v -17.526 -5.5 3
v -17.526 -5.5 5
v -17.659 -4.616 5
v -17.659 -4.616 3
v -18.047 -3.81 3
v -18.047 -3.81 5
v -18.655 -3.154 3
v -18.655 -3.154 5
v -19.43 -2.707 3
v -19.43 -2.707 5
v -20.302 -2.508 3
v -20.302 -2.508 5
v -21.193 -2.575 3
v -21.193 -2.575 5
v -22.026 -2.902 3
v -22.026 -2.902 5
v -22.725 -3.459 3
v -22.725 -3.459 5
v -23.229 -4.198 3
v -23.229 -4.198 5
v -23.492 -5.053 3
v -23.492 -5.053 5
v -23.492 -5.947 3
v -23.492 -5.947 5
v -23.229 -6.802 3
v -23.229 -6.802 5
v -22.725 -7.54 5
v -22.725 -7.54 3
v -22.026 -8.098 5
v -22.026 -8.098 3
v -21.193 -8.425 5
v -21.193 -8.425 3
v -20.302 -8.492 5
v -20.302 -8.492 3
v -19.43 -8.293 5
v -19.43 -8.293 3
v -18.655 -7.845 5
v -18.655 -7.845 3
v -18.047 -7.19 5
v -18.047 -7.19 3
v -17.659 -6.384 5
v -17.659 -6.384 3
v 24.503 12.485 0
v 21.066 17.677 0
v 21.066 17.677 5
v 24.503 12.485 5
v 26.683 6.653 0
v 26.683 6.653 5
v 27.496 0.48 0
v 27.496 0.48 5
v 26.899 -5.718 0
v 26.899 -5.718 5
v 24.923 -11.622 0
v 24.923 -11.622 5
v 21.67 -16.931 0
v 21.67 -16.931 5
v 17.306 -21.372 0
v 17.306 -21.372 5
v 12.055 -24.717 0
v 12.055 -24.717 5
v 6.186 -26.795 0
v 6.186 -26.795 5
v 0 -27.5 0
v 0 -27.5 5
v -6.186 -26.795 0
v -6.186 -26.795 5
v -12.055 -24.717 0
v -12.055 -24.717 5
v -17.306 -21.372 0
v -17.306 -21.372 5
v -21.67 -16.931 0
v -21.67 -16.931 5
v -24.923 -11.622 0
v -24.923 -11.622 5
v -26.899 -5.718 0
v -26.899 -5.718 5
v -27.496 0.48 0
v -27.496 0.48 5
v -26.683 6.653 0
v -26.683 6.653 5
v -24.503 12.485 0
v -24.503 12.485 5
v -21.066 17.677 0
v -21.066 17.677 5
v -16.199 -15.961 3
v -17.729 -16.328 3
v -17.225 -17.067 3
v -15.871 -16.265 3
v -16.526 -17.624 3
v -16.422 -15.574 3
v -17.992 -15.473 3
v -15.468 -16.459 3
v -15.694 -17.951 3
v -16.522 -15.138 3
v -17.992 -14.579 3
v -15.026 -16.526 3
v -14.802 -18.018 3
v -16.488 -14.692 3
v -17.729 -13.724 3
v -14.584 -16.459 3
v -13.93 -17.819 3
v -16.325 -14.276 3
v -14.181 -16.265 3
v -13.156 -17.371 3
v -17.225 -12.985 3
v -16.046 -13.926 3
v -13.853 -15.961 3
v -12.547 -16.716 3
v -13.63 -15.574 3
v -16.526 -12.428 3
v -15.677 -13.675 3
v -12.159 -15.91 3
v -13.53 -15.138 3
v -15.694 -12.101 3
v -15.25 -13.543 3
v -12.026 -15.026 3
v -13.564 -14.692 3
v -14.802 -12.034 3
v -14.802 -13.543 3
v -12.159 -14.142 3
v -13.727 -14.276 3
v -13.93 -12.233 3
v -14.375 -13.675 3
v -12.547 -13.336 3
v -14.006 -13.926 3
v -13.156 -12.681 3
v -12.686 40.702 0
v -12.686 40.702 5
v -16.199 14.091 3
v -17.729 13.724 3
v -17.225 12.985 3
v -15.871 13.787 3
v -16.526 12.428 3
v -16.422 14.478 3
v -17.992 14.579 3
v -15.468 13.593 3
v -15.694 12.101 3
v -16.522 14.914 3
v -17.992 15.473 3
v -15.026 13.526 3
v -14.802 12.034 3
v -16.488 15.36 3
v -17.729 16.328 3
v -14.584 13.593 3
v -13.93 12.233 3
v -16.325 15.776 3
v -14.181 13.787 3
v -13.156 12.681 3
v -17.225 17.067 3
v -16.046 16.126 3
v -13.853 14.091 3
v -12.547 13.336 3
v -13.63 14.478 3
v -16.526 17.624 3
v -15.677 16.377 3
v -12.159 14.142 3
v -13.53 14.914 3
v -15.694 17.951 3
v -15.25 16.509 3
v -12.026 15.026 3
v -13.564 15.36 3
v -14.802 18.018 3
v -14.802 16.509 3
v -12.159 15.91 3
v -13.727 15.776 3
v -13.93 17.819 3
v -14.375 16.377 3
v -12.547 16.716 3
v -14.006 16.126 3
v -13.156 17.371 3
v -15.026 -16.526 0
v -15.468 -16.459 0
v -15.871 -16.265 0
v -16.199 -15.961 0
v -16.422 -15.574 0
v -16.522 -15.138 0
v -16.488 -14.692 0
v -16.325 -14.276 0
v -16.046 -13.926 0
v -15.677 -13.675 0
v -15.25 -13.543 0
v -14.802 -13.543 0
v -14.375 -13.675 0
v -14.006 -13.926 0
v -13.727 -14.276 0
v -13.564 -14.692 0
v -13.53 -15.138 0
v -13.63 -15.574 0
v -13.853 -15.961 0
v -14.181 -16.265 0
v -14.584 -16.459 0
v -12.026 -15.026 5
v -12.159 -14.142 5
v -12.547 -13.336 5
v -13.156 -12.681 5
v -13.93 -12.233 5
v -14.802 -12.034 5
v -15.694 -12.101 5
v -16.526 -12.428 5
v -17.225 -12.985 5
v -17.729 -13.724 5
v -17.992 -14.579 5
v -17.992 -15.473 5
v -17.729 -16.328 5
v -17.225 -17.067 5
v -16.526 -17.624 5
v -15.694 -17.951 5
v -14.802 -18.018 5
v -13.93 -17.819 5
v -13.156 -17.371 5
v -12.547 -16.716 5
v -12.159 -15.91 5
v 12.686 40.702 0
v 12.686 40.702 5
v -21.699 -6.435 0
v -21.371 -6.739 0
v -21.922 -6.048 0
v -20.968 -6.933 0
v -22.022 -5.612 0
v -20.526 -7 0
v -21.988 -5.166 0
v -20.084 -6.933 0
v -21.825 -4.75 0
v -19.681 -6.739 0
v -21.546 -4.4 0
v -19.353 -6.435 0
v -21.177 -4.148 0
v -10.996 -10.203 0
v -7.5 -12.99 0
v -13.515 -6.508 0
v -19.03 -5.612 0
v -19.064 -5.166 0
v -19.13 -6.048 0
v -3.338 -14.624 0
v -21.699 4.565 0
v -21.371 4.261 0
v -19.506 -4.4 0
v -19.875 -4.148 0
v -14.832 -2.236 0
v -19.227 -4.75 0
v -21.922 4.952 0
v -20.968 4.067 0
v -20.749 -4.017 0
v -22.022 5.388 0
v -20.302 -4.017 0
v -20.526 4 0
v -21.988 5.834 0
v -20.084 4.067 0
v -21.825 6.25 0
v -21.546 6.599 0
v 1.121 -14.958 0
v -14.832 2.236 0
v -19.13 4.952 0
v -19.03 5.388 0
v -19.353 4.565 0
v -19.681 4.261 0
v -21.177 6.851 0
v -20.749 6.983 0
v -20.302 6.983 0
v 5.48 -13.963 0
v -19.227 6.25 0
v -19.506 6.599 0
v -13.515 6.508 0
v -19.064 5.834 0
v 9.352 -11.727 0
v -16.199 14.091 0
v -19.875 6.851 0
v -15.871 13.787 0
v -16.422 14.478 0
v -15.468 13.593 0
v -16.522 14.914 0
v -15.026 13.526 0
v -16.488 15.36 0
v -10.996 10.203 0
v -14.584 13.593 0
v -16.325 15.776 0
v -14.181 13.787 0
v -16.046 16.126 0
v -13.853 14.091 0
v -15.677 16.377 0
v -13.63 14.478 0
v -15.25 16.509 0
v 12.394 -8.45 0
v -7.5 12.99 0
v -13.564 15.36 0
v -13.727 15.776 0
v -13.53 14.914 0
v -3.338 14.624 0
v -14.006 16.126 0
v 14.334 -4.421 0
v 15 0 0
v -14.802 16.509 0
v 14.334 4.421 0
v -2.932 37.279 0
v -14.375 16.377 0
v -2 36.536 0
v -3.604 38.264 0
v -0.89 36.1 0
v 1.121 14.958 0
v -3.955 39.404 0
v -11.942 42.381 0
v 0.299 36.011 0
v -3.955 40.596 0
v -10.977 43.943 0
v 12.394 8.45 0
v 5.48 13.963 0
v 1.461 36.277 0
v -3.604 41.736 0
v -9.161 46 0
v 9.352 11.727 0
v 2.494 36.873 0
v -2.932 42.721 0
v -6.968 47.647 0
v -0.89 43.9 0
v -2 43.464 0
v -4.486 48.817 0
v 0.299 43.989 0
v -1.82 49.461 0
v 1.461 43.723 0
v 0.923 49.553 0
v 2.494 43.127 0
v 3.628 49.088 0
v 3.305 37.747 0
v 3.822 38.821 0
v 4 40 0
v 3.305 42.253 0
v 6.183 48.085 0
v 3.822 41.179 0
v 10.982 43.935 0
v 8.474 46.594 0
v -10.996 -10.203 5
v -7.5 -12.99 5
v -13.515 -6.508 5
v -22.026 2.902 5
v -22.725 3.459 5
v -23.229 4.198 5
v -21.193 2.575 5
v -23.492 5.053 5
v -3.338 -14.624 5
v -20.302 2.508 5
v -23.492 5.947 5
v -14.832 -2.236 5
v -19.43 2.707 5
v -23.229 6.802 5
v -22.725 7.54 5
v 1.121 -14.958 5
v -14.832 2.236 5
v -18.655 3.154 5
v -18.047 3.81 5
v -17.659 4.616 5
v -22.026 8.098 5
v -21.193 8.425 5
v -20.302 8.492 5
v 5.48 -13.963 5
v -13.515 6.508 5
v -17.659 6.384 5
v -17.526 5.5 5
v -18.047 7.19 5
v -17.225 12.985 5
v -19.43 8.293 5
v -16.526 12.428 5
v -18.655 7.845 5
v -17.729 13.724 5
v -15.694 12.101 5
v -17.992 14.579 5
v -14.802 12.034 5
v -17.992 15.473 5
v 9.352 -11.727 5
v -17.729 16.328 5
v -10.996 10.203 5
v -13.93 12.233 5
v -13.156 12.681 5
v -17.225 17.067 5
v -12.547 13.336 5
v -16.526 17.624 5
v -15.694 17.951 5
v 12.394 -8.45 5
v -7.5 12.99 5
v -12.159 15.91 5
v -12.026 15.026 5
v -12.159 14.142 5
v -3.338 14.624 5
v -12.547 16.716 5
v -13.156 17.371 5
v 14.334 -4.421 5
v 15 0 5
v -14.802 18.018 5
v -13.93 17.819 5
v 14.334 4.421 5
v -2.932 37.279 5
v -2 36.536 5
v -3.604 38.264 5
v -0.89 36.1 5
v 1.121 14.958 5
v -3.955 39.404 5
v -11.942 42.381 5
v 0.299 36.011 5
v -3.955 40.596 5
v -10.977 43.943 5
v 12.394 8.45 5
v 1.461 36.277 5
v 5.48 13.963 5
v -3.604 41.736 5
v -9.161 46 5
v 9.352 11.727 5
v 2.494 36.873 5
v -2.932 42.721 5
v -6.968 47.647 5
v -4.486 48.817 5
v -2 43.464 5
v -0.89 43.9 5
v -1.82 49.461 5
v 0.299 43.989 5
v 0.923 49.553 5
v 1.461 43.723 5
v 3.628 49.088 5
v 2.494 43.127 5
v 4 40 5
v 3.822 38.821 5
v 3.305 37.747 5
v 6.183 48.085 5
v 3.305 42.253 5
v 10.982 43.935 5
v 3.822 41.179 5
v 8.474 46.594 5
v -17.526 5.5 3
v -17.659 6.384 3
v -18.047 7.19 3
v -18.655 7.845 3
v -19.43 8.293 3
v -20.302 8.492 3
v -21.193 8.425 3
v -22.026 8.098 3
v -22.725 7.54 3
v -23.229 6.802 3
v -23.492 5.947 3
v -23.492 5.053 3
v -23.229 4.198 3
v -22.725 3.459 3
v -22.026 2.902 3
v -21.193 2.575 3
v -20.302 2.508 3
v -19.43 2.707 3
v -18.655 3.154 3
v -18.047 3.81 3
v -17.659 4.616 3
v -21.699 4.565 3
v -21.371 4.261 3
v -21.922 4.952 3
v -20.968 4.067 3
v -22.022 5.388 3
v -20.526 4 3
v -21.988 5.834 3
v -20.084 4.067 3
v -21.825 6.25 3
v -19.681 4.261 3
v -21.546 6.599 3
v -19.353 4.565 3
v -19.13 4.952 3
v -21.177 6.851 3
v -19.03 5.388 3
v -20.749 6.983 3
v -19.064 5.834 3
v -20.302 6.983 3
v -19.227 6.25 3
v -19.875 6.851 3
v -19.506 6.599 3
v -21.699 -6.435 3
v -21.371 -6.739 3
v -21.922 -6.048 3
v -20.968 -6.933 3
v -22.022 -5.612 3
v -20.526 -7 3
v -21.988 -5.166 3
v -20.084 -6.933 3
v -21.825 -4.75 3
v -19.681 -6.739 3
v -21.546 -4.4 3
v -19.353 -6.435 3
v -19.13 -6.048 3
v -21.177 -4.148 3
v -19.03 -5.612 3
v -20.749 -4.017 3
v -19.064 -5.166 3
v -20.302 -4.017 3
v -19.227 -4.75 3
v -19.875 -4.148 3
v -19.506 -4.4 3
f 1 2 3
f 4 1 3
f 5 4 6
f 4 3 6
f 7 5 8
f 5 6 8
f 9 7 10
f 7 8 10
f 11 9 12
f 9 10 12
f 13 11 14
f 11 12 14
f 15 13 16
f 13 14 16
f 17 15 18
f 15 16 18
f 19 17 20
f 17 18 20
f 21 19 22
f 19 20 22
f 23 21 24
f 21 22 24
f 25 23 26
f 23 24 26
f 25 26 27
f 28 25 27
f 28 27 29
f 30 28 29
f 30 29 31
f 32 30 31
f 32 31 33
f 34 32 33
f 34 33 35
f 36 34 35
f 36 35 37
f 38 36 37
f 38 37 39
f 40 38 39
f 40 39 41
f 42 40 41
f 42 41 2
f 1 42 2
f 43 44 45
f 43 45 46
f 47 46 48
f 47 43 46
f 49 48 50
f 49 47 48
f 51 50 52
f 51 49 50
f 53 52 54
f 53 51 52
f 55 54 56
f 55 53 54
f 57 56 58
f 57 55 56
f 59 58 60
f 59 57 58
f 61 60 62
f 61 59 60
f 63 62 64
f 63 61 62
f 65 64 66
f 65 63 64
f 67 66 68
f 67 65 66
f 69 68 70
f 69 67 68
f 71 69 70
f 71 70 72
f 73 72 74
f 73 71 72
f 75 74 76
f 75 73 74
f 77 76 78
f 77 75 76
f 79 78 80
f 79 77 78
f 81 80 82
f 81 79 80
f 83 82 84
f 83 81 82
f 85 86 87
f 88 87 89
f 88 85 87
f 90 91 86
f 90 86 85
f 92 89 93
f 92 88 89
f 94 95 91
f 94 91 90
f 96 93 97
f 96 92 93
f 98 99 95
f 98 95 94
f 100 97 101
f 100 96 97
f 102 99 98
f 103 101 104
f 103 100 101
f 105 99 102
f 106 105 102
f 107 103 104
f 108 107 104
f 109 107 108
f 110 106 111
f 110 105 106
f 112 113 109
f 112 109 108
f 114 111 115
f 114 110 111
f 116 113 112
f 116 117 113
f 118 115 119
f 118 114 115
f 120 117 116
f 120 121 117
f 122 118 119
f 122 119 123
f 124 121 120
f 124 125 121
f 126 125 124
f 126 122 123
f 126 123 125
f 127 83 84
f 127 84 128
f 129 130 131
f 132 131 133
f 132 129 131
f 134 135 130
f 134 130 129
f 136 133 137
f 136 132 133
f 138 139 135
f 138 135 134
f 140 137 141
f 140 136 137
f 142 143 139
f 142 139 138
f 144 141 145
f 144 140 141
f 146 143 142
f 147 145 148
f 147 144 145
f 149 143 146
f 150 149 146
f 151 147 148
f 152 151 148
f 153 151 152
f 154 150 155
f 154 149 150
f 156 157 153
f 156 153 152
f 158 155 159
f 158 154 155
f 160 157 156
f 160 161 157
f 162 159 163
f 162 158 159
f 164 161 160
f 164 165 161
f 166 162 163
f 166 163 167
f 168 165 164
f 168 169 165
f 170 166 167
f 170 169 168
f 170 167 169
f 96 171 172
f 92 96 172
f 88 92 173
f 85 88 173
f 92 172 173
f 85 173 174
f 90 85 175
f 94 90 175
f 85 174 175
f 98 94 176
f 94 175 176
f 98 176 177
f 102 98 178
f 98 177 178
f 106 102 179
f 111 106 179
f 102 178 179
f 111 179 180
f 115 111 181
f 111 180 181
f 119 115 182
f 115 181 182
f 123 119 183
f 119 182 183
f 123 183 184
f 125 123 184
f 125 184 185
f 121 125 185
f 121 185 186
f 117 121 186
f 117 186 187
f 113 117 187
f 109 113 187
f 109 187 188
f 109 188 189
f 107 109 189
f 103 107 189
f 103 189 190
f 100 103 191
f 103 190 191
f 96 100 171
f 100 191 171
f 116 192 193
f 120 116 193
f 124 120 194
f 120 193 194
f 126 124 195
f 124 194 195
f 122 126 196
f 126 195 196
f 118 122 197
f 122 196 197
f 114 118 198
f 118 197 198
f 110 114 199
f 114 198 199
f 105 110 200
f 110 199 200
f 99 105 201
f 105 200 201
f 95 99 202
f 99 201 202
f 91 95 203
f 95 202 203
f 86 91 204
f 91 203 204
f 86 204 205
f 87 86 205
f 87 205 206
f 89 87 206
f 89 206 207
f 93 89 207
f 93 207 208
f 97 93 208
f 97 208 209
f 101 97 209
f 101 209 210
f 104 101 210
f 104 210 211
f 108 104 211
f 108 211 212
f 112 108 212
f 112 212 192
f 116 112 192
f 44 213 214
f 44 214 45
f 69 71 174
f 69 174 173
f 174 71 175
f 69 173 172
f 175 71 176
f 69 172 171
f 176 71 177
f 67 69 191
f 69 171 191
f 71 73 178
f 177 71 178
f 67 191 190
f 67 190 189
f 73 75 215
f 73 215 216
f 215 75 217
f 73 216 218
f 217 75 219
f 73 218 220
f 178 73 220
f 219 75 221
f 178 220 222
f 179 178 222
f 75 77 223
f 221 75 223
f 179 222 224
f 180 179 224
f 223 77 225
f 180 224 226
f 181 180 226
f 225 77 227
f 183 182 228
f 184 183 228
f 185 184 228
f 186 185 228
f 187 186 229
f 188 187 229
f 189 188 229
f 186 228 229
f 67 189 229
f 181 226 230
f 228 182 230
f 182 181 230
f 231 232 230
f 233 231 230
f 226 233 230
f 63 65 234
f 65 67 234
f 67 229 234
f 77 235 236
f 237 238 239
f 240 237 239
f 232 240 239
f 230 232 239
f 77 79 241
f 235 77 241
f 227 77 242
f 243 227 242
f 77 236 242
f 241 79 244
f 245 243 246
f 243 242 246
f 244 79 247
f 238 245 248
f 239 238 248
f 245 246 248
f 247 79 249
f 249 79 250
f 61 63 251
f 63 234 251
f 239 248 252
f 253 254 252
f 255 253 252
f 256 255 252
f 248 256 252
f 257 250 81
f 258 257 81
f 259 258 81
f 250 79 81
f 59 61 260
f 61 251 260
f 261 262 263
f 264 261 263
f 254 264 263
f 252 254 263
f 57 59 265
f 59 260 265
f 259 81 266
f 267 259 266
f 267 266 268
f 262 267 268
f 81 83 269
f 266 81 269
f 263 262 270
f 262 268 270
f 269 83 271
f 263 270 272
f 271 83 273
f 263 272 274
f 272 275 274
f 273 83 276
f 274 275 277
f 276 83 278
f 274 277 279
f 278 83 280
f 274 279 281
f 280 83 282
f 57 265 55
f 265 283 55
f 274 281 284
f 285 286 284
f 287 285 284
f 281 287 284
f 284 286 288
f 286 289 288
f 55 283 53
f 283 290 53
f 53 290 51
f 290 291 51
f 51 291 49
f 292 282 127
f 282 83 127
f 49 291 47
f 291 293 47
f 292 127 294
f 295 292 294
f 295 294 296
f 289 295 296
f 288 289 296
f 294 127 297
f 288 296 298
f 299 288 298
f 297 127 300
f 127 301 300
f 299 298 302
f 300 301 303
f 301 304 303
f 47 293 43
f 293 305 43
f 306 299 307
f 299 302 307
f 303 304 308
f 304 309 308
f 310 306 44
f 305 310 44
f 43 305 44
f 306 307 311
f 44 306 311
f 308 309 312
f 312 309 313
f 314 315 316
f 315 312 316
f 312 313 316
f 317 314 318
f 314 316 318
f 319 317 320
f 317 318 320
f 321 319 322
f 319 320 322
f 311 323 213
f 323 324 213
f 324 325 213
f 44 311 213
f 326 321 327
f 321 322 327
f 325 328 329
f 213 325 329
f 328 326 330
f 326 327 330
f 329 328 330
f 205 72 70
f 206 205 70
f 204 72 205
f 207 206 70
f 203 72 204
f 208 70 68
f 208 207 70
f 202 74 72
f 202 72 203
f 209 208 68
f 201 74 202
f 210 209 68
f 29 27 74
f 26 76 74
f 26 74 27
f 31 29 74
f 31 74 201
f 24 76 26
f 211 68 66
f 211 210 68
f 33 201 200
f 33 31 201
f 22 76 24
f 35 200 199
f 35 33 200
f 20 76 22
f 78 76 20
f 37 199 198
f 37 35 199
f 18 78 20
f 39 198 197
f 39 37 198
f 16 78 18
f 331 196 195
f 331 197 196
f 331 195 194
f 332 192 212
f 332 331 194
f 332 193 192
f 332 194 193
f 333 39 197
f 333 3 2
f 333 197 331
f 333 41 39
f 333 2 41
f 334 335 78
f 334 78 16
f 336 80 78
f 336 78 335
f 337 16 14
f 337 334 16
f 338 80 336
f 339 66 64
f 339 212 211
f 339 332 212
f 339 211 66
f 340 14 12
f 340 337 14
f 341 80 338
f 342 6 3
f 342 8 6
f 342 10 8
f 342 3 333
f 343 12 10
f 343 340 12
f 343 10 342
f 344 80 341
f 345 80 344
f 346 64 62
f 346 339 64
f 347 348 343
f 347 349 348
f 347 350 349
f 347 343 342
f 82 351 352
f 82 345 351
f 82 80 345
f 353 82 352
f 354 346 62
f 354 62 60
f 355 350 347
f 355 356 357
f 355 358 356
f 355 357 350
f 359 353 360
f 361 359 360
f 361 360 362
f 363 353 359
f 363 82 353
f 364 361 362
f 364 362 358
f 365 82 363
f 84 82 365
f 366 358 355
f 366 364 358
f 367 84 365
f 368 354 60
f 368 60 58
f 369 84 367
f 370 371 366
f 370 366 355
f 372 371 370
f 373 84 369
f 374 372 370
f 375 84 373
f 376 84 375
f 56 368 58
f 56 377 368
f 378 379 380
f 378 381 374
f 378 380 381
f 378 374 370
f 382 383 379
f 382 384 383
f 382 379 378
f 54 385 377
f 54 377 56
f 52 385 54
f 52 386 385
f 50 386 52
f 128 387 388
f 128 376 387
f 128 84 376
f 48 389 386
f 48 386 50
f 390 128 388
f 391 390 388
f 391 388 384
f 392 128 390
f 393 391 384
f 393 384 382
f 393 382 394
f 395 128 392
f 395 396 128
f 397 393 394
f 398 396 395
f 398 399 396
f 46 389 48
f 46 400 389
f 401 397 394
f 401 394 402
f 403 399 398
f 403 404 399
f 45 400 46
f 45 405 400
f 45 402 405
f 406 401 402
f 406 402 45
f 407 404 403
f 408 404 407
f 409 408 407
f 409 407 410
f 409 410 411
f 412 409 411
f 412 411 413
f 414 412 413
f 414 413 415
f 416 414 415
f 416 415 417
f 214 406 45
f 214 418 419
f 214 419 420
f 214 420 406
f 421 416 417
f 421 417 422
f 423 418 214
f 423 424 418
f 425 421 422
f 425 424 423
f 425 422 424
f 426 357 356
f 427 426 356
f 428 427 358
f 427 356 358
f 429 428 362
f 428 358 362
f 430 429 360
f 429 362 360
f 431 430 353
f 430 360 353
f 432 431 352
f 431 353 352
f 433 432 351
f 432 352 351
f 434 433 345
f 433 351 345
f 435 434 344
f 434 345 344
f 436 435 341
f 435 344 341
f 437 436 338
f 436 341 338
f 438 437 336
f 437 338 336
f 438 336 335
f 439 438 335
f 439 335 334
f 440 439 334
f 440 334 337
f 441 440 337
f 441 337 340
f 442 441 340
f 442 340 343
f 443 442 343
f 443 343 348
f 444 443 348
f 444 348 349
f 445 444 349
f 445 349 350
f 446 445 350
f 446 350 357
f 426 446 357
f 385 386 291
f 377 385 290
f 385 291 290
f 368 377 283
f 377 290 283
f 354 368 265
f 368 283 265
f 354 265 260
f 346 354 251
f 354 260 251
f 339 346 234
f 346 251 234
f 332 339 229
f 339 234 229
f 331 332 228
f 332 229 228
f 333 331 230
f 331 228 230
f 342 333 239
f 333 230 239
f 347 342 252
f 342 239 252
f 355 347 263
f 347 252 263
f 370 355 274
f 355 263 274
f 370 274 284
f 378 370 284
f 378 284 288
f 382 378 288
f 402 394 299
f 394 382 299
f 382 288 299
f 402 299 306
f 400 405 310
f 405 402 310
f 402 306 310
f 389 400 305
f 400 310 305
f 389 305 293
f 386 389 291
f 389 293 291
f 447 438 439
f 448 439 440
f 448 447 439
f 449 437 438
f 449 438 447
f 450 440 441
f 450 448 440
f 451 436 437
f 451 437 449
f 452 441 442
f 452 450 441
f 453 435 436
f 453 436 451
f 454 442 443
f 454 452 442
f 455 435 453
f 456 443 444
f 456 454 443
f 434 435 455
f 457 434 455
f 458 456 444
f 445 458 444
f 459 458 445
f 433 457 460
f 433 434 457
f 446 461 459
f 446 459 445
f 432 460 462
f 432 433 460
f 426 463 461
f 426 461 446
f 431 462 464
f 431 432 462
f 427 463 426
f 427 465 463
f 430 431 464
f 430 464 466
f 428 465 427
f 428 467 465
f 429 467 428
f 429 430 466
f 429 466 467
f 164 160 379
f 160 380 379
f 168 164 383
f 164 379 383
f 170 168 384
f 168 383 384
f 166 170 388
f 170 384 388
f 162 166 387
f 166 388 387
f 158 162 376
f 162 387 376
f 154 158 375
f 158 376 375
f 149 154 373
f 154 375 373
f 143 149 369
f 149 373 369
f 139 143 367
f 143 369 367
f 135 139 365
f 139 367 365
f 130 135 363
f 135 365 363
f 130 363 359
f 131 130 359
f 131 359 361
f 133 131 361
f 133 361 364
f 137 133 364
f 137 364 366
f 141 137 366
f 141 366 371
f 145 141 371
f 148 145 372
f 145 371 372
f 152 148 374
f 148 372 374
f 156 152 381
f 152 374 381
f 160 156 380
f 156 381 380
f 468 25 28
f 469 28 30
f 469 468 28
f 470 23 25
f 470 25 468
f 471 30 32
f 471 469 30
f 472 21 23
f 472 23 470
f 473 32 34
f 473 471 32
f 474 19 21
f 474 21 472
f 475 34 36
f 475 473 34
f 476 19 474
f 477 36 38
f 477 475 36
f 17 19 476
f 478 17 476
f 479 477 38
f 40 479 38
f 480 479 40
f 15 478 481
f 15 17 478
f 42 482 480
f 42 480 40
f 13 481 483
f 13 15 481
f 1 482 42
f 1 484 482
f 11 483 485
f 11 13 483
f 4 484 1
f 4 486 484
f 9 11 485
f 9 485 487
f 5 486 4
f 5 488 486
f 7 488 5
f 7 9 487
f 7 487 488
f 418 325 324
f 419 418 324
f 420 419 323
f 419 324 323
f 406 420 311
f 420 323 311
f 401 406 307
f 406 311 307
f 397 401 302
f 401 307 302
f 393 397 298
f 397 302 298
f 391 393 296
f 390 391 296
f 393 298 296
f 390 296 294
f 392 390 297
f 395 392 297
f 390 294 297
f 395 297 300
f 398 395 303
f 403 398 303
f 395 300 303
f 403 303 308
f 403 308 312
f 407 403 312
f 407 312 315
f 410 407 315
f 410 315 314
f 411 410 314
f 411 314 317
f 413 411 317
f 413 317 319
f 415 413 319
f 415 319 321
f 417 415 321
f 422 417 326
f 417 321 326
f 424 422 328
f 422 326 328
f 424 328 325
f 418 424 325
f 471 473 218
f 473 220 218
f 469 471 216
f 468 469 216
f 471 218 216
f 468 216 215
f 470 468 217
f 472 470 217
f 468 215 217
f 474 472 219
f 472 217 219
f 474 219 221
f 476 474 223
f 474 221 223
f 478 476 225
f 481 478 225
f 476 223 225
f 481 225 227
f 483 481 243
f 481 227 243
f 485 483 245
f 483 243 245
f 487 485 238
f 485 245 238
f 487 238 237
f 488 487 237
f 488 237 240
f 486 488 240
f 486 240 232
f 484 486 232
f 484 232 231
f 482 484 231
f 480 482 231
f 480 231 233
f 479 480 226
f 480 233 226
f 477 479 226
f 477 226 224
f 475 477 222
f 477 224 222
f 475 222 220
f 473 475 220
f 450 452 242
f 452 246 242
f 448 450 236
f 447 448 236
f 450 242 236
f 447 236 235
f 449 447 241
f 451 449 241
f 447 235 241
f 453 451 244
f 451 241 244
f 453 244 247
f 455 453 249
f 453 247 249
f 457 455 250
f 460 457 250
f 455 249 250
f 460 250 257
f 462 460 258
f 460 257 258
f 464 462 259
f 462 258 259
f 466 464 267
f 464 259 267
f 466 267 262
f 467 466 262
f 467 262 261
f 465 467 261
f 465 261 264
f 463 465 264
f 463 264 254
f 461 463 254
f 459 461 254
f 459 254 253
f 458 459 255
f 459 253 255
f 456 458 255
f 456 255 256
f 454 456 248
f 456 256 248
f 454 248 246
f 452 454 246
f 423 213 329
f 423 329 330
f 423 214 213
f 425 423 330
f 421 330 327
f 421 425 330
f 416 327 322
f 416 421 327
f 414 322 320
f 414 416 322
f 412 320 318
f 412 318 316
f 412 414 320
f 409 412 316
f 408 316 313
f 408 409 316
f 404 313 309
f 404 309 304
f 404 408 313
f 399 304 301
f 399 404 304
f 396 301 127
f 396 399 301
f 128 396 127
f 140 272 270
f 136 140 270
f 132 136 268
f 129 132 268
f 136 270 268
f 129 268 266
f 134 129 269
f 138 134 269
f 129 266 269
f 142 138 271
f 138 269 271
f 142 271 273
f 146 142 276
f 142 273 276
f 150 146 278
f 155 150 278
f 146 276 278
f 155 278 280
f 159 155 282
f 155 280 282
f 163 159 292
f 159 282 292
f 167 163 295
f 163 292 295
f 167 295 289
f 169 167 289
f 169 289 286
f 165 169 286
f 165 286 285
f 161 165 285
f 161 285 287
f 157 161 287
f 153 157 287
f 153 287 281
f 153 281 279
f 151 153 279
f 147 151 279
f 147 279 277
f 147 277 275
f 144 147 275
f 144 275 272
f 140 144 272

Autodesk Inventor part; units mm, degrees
ref_plane "YZ Plane" through (0, 0, 0) normal (1, 0, 0) x (0, 1, 0)
ref_plane "XZ Plane" through (0, 0, 0) normal (0, 1, 0) x (-1, 0, 0)
ref_plane "XY Plane" through (0, 0, 0) normal (0, 0, 1) x (1, 0, 0)
sketch "スケッチ12" plane through (0, 0, 0) normal (0, 0, 1) x (1, 0, 0)
  circle A0 centre (0, 0) radius 27.5
  circle A1 centre (0, 0) radius 15
  line L0 (-27.5, 0) -> (27.5, 0)
  line L1 (-27.5, 0) -> (-9.3015, 50)
  line L2 (-9.3015, 50) -> (9.3015, 50)
  line L3 (9.3015, 50) -> (27.5, 0)
  circle A2 centre (0, 40) radius 4
  line L4 (9.3015, 50) -> (-27.5, 0)
  line L5 (-9.3015, 50) -> (27.5, 0)
  point P0 (21.0662, 17.6767)
  point P1 (-21.0662, 17.6767)
  point P2 (0, 51.9615)
  point P3 (8.174, 26.2571)
  point P4 (-8.174, 26.2571)
  point P5 (-2.2669, 48.0351)
  point P6 (2.2669, 48.0351)
  point P7 (0, 37.3626)
  point P8 (-15, 0)
  point P9 (15, 0)
  dimension "d5" = 55
  dimension "d6" = 30
  dimension "d10" = 70
  dimension "d11" = 70
  dimension "d12" = 50
  dimension "d13" = 40
  dimension "d14" = 8
  dimension "d47" = 0
extrude "押し出し2" add sketch "スケッチ12" along normal blind 5 contours L0 A1 A0 | L4 A0 L5 L0 A1 | A0 L1 | L1 A0 L4 | L3 A0 | L5 A0 L3 | L1 L5 A2 L4 A0 | L4 A2 L5 A0 | A0 L5 A2 L4 L3 | L2 L4 A2 L5
sketch "スケッチ13" plane through (0, 0, 5) normal (0, 0, 1) x (1, 0, 0)
  circle A0 centre (0, 0) radius 17.5
  circle A1 centre (0, 0) radius 25
  circle A2 centre (0, 0) radius 21.25
  line L0 (0, 0) -> (-18.638, 32.282)
  line L1 (-18.638, 32.282) -> (0, 0)
  line L2 (0, 0) -> (-17.2844, -29.9374)
  line L3 (0, 0) -> (-56.8729, 0)
  line L4 (0, 0) -> (-31.7394, -18.3248)
  line L5 (0, 0) -> (-33.3883, 19.2767)
  line L6 (0, 0) -> (0, -31.9785)
  line L7 (0, 0) -> (-25.7143, 25.7143)
  line L8 (0, 0) -> (-33.0547, 8.857)
  line L9 (0, 0) -> (-32.621, -8.7408)
  line L10 (0, 0) -> (-23.652, -23.652)
  point P0 (-18.403, 10.625)
  point P1 (-21.25, 0)
  point P2 (-18.403, -10.625)
  point P3 (-10.625, -18.403)
  point P4 (0, -21.25)
  point P5 (-16.5273, 4.4285)
  point P6 (-15.026, 15.026)
  point P7 (-20.5259, 5.4999)
  point P8 (-20.5259, -5.4999)
  point P9 (-15.026, -15.026)
  dimension "d19" = 42.5
  dimension "d17" = 35
  dimension "d18" = 50
  dimension "d20" = 60
  dimension "d21" = 60
  dimension "d22" = 30
  dimension "d23" = 30
  dimension "d31" = 150
  dimension "d32" = 15
  dimension "d34" = 15
  dimension "d35" = 15
  dimension "d36" = 15
hole "穴1" at (-15.026, 15.026, 5) at (-20.5259, 5.4999, 5) at (-20.5259, -5.4999, 5) at (-15.026, -15.026, 5) direction (0, 0, -1) diameter 3 end through all
sketch "スケッチ14" plane through (0, 0, 5) normal (0, 0, 1) x (1, 0, 0)
  circle A0 centre (-15.026, 15.026) radius 1.5 projected
  circle A1 centre (-15.026, 15.026) radius 3
  circle A2 centre (-20.5259, 5.4999) radius 1.5 projected
  circle A3 centre (-20.5259, 5.4999) radius 3
  circle A4 centre (-20.5259, -5.4999) radius 1.5 projected
  circle A5 centre (-20.5259, -5.4999) radius 3
  circle A6 centre (-15.026, -15.026) radius 1.5 projected
  circle A7 centre (-15.026, -15.026) radius 3
  point P0 (0, 0)
  dimension "d40" = 6
  dimension "d41" = 6
  dimension "d42" = 6
  dimension "d43" = 6
extrude "押し出し3" cut sketch "スケッチ14" against normal blind 2 contours A0 | A1 | A2 | A3 | A4 | A5 | A6 | A7
fillet "フィレット3" radius 13.5 2 edges at (9.3015, 50, 2.5) (-9.3015, 50, 2.5)
equation "\"d10\" = d11"
equation "\"d35\" = d34"
equation "\"d36\" = d35"
equation "\"d41\" = d40"
equation "\"d42\" = d41"
equation "\"d43\" = d42"
properties part number "legparts_04(seven)" material "ABS プラスチック"
